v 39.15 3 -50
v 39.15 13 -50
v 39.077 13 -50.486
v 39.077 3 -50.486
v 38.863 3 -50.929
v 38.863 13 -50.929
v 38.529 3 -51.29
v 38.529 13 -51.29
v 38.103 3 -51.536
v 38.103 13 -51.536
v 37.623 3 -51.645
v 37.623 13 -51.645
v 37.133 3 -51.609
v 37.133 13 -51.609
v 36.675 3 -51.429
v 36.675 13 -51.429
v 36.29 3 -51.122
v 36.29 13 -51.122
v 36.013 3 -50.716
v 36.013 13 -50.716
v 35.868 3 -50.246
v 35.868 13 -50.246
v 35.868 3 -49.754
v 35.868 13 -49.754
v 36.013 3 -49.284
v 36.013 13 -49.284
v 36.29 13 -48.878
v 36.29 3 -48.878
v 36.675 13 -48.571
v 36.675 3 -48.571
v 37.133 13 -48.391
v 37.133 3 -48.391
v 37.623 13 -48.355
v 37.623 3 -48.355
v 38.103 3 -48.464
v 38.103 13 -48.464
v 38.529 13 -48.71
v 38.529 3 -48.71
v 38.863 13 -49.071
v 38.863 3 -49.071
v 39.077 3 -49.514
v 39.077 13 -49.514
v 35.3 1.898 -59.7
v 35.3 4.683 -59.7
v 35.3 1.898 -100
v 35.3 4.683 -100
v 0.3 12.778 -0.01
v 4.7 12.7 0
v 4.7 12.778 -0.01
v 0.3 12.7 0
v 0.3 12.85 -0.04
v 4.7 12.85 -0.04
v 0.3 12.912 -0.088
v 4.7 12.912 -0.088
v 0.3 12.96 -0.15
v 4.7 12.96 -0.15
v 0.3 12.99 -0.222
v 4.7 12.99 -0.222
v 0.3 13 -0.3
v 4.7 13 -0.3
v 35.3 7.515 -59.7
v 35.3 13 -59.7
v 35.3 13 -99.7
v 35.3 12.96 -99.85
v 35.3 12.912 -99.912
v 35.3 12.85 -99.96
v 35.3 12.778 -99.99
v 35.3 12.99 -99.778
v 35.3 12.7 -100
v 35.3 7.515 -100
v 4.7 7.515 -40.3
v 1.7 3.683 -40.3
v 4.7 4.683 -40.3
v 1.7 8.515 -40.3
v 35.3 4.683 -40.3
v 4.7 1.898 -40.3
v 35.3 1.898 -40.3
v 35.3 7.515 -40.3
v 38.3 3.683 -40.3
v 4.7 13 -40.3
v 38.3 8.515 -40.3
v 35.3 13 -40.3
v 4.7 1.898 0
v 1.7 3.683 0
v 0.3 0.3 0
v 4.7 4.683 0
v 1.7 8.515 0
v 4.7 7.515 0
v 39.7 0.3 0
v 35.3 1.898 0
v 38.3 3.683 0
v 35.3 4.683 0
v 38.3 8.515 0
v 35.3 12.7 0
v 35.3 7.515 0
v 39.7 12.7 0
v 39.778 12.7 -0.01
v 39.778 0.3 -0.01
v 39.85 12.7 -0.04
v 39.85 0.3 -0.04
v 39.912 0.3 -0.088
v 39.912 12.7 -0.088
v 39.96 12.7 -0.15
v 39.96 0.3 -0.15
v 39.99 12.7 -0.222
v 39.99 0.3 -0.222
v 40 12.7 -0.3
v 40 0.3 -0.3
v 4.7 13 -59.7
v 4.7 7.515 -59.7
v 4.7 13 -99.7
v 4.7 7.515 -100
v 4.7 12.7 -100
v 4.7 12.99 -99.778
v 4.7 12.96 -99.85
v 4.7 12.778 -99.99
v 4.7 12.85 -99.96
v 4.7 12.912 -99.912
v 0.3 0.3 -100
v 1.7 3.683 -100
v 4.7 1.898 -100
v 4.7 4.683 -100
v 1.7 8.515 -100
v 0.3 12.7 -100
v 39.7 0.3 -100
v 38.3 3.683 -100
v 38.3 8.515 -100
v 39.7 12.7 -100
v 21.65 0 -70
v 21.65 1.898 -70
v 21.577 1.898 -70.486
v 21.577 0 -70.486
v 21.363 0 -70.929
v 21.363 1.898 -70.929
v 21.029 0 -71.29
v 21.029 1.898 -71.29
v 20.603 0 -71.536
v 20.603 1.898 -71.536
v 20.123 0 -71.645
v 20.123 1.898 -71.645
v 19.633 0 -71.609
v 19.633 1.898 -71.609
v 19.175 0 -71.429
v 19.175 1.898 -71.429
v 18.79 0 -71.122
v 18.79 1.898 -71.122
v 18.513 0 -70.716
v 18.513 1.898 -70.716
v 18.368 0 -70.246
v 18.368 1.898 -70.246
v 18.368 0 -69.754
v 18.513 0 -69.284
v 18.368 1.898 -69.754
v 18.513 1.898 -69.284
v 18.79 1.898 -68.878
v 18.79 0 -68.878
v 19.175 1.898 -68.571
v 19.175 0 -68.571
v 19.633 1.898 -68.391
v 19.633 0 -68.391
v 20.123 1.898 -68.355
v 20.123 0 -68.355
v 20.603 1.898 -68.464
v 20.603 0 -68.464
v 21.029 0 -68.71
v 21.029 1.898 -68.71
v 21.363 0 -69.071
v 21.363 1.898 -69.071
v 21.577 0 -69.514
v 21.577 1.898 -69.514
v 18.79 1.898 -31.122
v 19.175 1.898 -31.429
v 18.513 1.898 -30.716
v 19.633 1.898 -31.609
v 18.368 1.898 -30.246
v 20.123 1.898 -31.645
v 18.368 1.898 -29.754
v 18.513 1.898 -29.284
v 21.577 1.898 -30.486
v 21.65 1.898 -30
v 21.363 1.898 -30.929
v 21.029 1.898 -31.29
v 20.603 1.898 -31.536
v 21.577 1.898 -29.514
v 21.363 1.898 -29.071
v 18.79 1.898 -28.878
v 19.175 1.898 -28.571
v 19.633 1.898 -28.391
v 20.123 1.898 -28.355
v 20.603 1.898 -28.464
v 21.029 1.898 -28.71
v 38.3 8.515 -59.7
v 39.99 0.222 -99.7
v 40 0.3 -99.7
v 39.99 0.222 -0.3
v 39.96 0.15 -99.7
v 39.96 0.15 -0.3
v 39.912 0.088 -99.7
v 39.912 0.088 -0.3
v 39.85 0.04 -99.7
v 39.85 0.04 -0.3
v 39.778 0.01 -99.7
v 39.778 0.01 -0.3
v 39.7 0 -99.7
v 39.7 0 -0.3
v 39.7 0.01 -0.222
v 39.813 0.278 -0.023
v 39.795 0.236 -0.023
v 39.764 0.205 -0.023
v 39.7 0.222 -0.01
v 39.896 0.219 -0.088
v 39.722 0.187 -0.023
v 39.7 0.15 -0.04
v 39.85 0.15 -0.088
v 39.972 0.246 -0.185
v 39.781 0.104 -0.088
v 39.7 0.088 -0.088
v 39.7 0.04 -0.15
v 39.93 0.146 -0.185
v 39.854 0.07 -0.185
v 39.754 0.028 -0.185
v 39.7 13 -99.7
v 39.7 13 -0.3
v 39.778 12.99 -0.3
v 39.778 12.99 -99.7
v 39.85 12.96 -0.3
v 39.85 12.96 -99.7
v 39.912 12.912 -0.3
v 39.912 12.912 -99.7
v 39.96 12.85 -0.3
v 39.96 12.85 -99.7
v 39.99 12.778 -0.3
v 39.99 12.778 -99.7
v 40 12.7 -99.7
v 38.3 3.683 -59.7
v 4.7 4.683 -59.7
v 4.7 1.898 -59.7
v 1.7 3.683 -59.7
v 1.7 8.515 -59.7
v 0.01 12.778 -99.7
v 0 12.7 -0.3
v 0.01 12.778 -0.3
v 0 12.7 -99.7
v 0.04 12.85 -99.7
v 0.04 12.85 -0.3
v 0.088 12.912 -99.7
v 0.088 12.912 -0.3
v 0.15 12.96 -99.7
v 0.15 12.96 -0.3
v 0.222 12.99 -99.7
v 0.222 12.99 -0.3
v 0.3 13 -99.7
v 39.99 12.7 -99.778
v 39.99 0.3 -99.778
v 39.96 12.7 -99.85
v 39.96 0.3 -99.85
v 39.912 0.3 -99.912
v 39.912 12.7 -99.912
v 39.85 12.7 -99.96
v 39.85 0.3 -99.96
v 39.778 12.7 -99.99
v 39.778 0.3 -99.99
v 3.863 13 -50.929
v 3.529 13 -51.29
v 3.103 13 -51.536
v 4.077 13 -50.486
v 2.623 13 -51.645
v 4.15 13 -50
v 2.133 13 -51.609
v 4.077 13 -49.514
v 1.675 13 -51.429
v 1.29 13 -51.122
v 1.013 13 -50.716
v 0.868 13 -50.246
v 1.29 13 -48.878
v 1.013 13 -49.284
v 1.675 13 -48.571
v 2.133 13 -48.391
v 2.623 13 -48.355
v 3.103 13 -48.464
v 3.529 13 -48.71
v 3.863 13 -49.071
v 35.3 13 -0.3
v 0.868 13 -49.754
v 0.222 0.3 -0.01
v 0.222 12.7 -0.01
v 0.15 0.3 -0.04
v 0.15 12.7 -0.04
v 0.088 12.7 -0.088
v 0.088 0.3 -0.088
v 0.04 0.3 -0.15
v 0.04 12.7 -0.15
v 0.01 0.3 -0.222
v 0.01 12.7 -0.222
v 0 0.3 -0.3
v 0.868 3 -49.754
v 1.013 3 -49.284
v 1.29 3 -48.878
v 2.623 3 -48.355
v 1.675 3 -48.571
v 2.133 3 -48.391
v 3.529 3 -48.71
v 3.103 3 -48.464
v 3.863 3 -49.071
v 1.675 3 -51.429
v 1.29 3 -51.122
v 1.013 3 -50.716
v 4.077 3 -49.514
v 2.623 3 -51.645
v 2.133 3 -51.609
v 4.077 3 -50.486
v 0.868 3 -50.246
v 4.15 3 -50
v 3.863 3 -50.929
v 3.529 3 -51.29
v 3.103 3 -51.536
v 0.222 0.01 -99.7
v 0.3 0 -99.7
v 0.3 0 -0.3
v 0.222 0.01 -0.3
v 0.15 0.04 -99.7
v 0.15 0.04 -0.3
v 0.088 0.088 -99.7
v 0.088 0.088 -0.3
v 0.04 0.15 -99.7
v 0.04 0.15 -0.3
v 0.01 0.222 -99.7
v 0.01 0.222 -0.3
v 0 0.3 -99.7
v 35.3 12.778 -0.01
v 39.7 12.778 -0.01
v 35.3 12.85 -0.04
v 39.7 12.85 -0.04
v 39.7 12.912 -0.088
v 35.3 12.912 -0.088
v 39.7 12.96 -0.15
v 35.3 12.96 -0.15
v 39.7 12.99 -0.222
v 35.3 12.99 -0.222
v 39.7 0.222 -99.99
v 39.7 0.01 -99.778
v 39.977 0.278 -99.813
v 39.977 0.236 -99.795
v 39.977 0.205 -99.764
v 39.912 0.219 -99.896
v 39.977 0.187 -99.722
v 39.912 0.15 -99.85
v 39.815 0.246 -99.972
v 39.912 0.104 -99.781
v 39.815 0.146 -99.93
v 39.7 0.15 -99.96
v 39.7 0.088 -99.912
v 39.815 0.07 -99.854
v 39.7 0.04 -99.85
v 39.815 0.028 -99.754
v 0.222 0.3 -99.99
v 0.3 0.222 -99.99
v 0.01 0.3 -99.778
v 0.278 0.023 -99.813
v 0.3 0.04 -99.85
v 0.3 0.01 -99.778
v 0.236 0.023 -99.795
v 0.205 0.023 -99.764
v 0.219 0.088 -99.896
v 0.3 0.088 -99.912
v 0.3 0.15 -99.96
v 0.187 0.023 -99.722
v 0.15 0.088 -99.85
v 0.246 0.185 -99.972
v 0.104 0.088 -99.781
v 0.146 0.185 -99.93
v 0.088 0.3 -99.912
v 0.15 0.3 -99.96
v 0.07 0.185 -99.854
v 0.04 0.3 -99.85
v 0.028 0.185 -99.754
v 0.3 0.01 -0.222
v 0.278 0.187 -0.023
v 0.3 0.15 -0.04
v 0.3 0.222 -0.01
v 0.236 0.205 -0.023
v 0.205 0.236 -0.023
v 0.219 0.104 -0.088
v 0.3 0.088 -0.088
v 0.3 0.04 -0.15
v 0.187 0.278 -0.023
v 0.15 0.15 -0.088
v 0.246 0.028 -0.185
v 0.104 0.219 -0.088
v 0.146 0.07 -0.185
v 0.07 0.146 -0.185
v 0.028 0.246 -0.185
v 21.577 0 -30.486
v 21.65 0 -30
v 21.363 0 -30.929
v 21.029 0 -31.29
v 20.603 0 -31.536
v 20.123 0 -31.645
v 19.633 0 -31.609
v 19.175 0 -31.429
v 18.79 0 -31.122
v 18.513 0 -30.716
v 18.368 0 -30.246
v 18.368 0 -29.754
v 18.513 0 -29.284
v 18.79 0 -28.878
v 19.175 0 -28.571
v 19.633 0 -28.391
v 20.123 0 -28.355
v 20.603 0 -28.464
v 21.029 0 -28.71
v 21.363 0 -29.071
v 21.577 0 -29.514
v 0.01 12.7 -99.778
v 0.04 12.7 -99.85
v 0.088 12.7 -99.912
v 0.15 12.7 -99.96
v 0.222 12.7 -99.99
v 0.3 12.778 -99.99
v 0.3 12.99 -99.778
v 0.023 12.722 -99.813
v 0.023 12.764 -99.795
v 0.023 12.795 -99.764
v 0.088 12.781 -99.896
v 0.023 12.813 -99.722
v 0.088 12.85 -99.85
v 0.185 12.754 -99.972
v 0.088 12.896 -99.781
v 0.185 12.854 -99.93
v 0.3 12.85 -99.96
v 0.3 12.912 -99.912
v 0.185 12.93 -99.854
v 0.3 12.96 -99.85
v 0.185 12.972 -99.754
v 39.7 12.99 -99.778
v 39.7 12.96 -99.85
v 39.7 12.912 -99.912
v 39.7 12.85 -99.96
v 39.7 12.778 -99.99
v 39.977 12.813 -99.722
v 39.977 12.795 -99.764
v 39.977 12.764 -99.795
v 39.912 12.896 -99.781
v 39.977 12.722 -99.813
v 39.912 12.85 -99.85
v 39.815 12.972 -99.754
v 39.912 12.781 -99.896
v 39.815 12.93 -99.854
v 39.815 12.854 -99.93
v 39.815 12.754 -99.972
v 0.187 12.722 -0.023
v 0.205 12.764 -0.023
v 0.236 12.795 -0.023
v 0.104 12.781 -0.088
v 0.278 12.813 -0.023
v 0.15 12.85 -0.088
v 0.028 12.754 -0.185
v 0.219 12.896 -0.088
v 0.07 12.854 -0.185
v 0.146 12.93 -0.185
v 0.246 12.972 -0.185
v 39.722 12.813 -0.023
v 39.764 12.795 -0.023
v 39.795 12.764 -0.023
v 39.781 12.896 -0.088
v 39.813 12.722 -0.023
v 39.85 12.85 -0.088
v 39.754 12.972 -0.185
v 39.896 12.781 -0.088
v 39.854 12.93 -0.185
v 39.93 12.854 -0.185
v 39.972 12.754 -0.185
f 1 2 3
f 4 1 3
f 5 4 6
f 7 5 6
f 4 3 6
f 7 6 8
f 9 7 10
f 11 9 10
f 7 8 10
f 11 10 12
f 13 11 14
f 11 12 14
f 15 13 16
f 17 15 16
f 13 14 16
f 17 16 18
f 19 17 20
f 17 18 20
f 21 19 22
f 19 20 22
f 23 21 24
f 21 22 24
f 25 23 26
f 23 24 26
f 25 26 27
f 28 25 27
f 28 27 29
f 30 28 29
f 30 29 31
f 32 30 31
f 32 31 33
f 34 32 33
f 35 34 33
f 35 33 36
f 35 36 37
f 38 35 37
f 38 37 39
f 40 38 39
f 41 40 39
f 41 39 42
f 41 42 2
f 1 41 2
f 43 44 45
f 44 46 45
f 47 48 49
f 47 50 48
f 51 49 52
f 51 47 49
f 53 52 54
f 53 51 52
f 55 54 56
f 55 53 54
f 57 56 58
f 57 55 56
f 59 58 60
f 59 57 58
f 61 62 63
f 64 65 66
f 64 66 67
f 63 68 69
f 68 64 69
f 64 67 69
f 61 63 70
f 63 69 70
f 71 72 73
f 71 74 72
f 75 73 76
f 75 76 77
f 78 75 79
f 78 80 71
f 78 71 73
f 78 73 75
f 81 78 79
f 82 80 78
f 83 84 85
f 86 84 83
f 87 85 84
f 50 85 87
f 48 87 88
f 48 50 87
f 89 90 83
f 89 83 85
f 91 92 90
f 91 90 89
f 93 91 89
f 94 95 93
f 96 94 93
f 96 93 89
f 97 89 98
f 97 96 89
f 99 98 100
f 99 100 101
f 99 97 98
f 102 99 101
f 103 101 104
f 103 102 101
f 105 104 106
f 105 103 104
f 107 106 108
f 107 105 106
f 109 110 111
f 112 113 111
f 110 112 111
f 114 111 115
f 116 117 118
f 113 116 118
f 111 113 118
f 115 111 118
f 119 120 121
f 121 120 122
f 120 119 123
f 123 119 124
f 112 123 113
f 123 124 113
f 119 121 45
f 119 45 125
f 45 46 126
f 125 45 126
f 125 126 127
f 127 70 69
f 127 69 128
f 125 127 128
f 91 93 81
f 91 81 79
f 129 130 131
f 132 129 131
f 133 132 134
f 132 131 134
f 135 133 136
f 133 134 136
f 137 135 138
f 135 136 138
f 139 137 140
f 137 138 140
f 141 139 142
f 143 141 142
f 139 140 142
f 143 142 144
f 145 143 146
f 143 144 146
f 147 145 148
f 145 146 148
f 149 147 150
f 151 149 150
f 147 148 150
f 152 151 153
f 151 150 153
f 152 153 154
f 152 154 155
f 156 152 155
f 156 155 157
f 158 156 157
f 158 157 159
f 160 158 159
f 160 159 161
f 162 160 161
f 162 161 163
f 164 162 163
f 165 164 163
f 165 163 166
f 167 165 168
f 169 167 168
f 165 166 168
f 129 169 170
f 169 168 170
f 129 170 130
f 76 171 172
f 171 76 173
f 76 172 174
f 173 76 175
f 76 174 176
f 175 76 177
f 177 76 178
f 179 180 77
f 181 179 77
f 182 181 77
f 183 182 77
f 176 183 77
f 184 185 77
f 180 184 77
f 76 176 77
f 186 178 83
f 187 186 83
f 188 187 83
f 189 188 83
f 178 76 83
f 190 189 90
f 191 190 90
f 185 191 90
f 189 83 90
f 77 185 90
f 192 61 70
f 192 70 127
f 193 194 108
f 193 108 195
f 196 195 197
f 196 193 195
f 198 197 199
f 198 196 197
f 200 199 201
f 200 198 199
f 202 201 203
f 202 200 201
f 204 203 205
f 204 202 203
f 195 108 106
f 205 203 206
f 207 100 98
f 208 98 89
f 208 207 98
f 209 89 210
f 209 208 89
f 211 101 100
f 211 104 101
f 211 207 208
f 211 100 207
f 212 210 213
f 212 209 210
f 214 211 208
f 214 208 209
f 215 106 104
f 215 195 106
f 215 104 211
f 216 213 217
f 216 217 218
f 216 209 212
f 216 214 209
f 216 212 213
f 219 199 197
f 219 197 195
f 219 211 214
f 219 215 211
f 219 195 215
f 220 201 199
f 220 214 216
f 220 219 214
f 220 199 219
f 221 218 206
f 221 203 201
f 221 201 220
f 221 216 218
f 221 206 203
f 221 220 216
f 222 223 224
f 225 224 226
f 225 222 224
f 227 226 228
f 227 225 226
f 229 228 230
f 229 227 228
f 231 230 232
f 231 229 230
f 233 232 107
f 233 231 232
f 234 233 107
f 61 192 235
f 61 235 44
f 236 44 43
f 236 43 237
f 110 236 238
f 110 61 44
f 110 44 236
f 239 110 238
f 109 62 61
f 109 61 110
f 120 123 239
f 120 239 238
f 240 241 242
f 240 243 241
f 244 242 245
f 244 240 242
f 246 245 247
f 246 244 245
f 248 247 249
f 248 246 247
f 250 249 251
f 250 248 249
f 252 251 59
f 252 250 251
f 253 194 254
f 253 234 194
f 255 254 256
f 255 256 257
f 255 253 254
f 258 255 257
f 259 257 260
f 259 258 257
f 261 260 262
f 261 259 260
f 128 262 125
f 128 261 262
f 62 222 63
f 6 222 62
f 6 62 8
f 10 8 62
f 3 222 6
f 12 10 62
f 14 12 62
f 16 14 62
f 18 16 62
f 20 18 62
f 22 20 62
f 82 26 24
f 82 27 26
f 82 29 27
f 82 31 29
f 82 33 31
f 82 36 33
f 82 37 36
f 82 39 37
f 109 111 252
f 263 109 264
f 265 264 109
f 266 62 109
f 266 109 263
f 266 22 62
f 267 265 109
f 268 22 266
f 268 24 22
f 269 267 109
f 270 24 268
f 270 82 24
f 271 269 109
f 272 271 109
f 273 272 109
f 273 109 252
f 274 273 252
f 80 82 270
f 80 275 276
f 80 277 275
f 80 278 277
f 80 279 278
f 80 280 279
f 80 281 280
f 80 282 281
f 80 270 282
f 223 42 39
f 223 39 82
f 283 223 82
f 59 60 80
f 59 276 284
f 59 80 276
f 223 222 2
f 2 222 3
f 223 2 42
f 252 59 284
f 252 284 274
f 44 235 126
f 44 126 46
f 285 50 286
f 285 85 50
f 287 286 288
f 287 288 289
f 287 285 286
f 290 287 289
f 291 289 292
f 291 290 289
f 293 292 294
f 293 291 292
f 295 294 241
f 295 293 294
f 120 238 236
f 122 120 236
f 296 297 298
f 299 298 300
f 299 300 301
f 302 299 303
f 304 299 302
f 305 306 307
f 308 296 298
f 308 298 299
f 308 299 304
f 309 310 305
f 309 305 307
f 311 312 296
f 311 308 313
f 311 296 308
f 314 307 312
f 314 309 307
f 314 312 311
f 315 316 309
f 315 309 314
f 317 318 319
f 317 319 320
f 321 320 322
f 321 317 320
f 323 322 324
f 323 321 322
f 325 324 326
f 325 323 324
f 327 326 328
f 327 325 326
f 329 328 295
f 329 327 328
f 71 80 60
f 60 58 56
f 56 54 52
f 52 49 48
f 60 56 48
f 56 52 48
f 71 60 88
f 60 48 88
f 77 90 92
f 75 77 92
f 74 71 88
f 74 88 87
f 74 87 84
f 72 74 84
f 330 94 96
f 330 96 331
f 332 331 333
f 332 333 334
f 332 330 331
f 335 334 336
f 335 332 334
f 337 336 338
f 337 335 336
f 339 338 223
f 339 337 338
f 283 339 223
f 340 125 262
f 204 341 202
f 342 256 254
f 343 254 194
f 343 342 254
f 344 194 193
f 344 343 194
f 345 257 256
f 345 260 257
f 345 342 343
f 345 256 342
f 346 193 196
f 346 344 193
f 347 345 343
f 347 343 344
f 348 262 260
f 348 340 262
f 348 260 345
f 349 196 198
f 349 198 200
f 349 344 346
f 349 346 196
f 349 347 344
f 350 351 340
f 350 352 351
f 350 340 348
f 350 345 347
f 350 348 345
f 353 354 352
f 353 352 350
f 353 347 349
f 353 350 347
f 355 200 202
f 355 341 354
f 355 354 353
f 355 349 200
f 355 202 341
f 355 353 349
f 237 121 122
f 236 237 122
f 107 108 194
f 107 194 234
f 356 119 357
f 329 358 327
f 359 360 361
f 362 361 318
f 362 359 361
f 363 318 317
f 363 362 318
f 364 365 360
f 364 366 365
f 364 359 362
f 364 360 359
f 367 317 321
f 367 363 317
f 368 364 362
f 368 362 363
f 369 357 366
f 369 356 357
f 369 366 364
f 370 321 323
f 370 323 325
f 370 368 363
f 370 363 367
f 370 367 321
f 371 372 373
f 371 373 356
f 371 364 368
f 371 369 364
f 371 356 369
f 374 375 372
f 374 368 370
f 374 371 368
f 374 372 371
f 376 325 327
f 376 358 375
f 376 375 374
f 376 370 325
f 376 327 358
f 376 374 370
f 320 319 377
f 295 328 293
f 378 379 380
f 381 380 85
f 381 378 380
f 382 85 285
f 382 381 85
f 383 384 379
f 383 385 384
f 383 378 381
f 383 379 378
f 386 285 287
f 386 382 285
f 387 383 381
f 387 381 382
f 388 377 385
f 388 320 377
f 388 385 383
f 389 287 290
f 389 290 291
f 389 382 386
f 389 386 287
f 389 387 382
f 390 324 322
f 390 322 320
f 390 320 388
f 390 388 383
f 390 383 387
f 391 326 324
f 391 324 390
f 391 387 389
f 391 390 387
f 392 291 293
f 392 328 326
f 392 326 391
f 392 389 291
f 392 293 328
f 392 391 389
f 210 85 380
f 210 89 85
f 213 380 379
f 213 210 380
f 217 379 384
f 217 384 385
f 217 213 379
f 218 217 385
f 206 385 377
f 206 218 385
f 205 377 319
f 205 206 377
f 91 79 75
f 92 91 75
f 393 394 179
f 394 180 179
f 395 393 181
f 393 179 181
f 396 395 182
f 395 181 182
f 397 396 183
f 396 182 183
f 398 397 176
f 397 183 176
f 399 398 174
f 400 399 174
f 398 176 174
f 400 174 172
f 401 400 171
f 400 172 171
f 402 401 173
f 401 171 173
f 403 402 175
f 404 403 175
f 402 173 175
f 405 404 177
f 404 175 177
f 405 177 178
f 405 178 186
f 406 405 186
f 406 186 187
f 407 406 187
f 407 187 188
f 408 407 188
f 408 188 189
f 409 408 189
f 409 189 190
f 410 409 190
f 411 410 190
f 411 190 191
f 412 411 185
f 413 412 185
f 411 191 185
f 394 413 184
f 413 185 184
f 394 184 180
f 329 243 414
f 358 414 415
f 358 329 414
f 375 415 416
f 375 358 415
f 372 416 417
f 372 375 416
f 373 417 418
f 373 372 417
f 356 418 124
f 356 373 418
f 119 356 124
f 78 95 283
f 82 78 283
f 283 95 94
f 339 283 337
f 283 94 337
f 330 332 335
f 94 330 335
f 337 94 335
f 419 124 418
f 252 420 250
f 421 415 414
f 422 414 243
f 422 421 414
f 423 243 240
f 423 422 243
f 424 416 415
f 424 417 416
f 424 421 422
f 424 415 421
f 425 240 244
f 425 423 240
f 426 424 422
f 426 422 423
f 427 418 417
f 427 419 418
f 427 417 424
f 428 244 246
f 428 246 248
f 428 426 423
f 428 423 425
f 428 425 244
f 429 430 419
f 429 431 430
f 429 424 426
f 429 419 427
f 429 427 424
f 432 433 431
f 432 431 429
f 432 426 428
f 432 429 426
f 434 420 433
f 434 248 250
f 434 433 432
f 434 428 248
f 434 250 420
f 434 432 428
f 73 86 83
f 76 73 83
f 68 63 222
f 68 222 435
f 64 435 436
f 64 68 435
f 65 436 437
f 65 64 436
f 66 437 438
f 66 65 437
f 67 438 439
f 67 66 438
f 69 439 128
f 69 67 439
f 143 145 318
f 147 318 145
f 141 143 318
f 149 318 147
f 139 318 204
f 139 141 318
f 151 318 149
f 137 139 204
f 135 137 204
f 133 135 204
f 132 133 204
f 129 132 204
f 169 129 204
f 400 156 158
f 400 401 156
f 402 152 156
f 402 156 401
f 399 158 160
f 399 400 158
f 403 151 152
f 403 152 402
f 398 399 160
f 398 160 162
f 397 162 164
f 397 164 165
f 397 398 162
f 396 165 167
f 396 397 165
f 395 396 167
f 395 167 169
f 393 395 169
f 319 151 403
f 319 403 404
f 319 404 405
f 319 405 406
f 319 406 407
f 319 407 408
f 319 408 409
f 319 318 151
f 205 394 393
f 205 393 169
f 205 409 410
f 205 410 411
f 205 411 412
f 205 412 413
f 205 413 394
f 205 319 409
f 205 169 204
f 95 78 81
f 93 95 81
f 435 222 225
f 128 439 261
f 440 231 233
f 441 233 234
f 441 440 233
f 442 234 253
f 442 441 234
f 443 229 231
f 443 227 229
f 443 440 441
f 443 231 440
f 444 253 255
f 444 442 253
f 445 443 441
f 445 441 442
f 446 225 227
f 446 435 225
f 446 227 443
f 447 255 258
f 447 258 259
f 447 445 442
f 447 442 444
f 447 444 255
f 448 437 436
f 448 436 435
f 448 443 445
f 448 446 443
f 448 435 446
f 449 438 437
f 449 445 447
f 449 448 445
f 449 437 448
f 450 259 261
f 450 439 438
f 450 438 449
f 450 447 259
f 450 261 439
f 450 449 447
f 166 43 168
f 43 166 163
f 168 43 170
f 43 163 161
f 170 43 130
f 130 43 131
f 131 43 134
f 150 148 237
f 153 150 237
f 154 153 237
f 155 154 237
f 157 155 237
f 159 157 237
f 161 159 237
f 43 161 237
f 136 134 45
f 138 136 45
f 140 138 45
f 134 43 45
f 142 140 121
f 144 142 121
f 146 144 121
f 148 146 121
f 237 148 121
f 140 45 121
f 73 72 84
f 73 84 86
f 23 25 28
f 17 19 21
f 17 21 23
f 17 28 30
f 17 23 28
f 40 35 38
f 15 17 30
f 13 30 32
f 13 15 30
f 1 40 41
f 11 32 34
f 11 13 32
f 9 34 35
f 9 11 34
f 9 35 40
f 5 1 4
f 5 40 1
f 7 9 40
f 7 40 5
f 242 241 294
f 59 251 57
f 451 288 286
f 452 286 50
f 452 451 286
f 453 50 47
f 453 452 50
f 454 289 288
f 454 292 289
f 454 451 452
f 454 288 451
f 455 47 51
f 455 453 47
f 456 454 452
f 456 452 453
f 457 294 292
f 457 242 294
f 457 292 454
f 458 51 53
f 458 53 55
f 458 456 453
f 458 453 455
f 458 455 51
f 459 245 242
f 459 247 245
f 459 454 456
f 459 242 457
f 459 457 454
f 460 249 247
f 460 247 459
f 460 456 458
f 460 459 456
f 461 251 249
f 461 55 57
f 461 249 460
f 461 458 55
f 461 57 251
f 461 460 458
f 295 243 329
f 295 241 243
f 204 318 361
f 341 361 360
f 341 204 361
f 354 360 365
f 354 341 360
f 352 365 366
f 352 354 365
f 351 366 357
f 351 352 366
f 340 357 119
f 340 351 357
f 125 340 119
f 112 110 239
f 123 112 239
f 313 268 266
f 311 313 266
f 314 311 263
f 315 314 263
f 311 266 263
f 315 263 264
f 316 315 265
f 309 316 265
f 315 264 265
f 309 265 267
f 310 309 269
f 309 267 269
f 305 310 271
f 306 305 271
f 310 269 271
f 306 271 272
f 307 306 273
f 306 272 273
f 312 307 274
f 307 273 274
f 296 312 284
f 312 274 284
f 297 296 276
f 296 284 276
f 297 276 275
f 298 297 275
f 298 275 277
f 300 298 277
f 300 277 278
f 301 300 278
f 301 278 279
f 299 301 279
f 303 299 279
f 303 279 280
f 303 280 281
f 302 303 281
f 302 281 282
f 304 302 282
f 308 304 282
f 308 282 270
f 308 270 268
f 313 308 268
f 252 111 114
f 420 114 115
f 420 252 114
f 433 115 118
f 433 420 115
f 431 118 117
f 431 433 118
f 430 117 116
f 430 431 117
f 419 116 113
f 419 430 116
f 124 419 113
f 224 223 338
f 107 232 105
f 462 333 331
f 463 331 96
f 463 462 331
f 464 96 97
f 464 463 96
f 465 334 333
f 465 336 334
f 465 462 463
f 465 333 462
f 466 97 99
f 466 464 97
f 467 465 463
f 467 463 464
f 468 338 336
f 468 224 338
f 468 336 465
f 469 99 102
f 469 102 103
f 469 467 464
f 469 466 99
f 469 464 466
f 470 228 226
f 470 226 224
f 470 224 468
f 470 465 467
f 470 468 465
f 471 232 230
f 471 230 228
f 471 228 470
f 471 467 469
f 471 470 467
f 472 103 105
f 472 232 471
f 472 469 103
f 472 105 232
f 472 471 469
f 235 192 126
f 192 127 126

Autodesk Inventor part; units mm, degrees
ref_plane "YZ Plane" through (0, 0, 0) normal (1, 0, 0) x (0, 1, 0)
ref_plane "XZ Plane" through (0, 0, 0) normal (0, 1, 0) x (-1, 0, 0)
ref_plane "XY Plane" through (0, 0, 0) normal (0, 0, 1) x (1, 0, 0)
sketch "Sketch1" plane through (0, 0, 0) normal (0, 0, 1) x (1, 0, 0)
  line L0 (0, 0) -> (40, 0)
  line L1 (40, 0) -> (40, 13)
  line L2 (40, 13) -> (0, 13)
  line L3 (0, 13) -> (0, 0)
  dimension "d0" = 40
  dimension "d1" = 13
extrude "Extrusion1" add sketch "Sketch1" against normal blind 100
sketch "Sketch2" plane through (0, 0, 0) normal (0, 0, 1) x (1, 0, 0)
  line L0 (4.7, 1.898) -> (35.3, 1.898)
  line L1 (38.3, 8.5152) -> (38.3, 3.6828)
  line L2 (1.7, 8.5152) -> (1.7, 3.6828)
  line L3 (35.3, 7.5152) -> (38.3, 8.5152)
  line L4 (35.3, 7.5152) -> (35.3, 13)
  line L5 (35.3, 1.898) -> (35.3, 4.6828)
  line L6 (38.3, 3.6828) -> (35.3, 4.6828)
  line L7 (4.7, 7.5152) -> (1.7, 8.5152)
  line L8 (4.7, 13) -> (4.7, 7.5152)
  line L9 (4.7, 4.6828) -> (4.7, 1.898)
  line L10 (1.7, 3.6828) -> (4.7, 4.6828)
  line L11 (4.7, 13) -> (35.3, 13)
  point P0 (0, 13)
  point P1 (40, 13)
extrude "Extrusion2" cut sketch "Sketch2" against normal blind 40.3
sketch "Sketch3" plane through (0, 0, -100) normal (0, 0, -1) x (-1, 0, 0)
  line L0 (-35.3, 1.898) -> (-4.7, 1.898)
  line L1 (-1.7, 8.5152) -> (-1.7, 3.6828)
  line L2 (-38.3, 8.5152) -> (-38.3, 3.6828)
  line L3 (-4.7, 7.5152) -> (-1.7, 8.5152)
  line L4 (-4.7, 7.5152) -> (-4.7, 13)
  line L5 (-4.7, 1.898) -> (-4.7, 4.6828)
  line L6 (-1.7, 3.6828) -> (-4.7, 4.6828)
  line L7 (-35.3, 7.5152) -> (-38.3, 8.5152)
  line L8 (-35.3, 13) -> (-35.3, 7.5152)
  line L9 (-35.3, 4.6828) -> (-35.3, 1.898)
  line L10 (-38.3, 3.6828) -> (-35.3, 4.6828)
  line L11 (-35.3, 13) -> (-4.7, 13)
  point P0 (-40, 13)
  point P1 (0, 13)
extrude "Extrusion3" cut sketch "Sketch3" against normal blind 40.3
sketch "Sketch5" plane through (4.7, 1.898, 0) normal (0, 1, 0) x (1, 0, 0)
  circle A0 centre (15.3, 30) radius 1.65
  line L0 (35.3, 0) -> (35.3, 100) projected
  circle A1 centre (15.3, 70) radius 1.65
  point P0 (-4.7, 0)
extrude "Extrusion5" cut sketch "Sketch5" against normal blind 5
fillet "Fillet1" radius 0.3 14 edges at (2.35, 13, -100) (37.65, 13, -100) (0, 6.5, -100) (0, 13, -50) (0, 0, -50) (20, 0, -100) (40, 6.5, -100) (0, 6.5, 0) (40, 13, -50) (40, 0, -50) (20, 0, 0) (40, 6.5, 0) (2.35, 13, 0) (37.65, 13, 0)
sketch "Sketch6" plane through (4.7, 13, -40.3) normal (0, 1, 0) x (1, 0, 0)
  line L0 (-4.4, -40) -> (-4.4, 59.4) projected
  line L1 (-4.7, 59.4) -> (-4.7, -40) projected
  line L2 (35.3, -40) -> (35.3, 59.4) projected
  circle A0 centre (32.8, 9.7) radius 1.65
  circle A1 centre (-2.2, 9.7) radius 1.65
  point P0 (-4.7, -40.3)
  dimension "d29" = 3.3
  dimension "d30" = 3.3
extrude "Extrusion6" cut sketch "Sketch6" against normal blind 10
properties part number "centralBodyThick"
